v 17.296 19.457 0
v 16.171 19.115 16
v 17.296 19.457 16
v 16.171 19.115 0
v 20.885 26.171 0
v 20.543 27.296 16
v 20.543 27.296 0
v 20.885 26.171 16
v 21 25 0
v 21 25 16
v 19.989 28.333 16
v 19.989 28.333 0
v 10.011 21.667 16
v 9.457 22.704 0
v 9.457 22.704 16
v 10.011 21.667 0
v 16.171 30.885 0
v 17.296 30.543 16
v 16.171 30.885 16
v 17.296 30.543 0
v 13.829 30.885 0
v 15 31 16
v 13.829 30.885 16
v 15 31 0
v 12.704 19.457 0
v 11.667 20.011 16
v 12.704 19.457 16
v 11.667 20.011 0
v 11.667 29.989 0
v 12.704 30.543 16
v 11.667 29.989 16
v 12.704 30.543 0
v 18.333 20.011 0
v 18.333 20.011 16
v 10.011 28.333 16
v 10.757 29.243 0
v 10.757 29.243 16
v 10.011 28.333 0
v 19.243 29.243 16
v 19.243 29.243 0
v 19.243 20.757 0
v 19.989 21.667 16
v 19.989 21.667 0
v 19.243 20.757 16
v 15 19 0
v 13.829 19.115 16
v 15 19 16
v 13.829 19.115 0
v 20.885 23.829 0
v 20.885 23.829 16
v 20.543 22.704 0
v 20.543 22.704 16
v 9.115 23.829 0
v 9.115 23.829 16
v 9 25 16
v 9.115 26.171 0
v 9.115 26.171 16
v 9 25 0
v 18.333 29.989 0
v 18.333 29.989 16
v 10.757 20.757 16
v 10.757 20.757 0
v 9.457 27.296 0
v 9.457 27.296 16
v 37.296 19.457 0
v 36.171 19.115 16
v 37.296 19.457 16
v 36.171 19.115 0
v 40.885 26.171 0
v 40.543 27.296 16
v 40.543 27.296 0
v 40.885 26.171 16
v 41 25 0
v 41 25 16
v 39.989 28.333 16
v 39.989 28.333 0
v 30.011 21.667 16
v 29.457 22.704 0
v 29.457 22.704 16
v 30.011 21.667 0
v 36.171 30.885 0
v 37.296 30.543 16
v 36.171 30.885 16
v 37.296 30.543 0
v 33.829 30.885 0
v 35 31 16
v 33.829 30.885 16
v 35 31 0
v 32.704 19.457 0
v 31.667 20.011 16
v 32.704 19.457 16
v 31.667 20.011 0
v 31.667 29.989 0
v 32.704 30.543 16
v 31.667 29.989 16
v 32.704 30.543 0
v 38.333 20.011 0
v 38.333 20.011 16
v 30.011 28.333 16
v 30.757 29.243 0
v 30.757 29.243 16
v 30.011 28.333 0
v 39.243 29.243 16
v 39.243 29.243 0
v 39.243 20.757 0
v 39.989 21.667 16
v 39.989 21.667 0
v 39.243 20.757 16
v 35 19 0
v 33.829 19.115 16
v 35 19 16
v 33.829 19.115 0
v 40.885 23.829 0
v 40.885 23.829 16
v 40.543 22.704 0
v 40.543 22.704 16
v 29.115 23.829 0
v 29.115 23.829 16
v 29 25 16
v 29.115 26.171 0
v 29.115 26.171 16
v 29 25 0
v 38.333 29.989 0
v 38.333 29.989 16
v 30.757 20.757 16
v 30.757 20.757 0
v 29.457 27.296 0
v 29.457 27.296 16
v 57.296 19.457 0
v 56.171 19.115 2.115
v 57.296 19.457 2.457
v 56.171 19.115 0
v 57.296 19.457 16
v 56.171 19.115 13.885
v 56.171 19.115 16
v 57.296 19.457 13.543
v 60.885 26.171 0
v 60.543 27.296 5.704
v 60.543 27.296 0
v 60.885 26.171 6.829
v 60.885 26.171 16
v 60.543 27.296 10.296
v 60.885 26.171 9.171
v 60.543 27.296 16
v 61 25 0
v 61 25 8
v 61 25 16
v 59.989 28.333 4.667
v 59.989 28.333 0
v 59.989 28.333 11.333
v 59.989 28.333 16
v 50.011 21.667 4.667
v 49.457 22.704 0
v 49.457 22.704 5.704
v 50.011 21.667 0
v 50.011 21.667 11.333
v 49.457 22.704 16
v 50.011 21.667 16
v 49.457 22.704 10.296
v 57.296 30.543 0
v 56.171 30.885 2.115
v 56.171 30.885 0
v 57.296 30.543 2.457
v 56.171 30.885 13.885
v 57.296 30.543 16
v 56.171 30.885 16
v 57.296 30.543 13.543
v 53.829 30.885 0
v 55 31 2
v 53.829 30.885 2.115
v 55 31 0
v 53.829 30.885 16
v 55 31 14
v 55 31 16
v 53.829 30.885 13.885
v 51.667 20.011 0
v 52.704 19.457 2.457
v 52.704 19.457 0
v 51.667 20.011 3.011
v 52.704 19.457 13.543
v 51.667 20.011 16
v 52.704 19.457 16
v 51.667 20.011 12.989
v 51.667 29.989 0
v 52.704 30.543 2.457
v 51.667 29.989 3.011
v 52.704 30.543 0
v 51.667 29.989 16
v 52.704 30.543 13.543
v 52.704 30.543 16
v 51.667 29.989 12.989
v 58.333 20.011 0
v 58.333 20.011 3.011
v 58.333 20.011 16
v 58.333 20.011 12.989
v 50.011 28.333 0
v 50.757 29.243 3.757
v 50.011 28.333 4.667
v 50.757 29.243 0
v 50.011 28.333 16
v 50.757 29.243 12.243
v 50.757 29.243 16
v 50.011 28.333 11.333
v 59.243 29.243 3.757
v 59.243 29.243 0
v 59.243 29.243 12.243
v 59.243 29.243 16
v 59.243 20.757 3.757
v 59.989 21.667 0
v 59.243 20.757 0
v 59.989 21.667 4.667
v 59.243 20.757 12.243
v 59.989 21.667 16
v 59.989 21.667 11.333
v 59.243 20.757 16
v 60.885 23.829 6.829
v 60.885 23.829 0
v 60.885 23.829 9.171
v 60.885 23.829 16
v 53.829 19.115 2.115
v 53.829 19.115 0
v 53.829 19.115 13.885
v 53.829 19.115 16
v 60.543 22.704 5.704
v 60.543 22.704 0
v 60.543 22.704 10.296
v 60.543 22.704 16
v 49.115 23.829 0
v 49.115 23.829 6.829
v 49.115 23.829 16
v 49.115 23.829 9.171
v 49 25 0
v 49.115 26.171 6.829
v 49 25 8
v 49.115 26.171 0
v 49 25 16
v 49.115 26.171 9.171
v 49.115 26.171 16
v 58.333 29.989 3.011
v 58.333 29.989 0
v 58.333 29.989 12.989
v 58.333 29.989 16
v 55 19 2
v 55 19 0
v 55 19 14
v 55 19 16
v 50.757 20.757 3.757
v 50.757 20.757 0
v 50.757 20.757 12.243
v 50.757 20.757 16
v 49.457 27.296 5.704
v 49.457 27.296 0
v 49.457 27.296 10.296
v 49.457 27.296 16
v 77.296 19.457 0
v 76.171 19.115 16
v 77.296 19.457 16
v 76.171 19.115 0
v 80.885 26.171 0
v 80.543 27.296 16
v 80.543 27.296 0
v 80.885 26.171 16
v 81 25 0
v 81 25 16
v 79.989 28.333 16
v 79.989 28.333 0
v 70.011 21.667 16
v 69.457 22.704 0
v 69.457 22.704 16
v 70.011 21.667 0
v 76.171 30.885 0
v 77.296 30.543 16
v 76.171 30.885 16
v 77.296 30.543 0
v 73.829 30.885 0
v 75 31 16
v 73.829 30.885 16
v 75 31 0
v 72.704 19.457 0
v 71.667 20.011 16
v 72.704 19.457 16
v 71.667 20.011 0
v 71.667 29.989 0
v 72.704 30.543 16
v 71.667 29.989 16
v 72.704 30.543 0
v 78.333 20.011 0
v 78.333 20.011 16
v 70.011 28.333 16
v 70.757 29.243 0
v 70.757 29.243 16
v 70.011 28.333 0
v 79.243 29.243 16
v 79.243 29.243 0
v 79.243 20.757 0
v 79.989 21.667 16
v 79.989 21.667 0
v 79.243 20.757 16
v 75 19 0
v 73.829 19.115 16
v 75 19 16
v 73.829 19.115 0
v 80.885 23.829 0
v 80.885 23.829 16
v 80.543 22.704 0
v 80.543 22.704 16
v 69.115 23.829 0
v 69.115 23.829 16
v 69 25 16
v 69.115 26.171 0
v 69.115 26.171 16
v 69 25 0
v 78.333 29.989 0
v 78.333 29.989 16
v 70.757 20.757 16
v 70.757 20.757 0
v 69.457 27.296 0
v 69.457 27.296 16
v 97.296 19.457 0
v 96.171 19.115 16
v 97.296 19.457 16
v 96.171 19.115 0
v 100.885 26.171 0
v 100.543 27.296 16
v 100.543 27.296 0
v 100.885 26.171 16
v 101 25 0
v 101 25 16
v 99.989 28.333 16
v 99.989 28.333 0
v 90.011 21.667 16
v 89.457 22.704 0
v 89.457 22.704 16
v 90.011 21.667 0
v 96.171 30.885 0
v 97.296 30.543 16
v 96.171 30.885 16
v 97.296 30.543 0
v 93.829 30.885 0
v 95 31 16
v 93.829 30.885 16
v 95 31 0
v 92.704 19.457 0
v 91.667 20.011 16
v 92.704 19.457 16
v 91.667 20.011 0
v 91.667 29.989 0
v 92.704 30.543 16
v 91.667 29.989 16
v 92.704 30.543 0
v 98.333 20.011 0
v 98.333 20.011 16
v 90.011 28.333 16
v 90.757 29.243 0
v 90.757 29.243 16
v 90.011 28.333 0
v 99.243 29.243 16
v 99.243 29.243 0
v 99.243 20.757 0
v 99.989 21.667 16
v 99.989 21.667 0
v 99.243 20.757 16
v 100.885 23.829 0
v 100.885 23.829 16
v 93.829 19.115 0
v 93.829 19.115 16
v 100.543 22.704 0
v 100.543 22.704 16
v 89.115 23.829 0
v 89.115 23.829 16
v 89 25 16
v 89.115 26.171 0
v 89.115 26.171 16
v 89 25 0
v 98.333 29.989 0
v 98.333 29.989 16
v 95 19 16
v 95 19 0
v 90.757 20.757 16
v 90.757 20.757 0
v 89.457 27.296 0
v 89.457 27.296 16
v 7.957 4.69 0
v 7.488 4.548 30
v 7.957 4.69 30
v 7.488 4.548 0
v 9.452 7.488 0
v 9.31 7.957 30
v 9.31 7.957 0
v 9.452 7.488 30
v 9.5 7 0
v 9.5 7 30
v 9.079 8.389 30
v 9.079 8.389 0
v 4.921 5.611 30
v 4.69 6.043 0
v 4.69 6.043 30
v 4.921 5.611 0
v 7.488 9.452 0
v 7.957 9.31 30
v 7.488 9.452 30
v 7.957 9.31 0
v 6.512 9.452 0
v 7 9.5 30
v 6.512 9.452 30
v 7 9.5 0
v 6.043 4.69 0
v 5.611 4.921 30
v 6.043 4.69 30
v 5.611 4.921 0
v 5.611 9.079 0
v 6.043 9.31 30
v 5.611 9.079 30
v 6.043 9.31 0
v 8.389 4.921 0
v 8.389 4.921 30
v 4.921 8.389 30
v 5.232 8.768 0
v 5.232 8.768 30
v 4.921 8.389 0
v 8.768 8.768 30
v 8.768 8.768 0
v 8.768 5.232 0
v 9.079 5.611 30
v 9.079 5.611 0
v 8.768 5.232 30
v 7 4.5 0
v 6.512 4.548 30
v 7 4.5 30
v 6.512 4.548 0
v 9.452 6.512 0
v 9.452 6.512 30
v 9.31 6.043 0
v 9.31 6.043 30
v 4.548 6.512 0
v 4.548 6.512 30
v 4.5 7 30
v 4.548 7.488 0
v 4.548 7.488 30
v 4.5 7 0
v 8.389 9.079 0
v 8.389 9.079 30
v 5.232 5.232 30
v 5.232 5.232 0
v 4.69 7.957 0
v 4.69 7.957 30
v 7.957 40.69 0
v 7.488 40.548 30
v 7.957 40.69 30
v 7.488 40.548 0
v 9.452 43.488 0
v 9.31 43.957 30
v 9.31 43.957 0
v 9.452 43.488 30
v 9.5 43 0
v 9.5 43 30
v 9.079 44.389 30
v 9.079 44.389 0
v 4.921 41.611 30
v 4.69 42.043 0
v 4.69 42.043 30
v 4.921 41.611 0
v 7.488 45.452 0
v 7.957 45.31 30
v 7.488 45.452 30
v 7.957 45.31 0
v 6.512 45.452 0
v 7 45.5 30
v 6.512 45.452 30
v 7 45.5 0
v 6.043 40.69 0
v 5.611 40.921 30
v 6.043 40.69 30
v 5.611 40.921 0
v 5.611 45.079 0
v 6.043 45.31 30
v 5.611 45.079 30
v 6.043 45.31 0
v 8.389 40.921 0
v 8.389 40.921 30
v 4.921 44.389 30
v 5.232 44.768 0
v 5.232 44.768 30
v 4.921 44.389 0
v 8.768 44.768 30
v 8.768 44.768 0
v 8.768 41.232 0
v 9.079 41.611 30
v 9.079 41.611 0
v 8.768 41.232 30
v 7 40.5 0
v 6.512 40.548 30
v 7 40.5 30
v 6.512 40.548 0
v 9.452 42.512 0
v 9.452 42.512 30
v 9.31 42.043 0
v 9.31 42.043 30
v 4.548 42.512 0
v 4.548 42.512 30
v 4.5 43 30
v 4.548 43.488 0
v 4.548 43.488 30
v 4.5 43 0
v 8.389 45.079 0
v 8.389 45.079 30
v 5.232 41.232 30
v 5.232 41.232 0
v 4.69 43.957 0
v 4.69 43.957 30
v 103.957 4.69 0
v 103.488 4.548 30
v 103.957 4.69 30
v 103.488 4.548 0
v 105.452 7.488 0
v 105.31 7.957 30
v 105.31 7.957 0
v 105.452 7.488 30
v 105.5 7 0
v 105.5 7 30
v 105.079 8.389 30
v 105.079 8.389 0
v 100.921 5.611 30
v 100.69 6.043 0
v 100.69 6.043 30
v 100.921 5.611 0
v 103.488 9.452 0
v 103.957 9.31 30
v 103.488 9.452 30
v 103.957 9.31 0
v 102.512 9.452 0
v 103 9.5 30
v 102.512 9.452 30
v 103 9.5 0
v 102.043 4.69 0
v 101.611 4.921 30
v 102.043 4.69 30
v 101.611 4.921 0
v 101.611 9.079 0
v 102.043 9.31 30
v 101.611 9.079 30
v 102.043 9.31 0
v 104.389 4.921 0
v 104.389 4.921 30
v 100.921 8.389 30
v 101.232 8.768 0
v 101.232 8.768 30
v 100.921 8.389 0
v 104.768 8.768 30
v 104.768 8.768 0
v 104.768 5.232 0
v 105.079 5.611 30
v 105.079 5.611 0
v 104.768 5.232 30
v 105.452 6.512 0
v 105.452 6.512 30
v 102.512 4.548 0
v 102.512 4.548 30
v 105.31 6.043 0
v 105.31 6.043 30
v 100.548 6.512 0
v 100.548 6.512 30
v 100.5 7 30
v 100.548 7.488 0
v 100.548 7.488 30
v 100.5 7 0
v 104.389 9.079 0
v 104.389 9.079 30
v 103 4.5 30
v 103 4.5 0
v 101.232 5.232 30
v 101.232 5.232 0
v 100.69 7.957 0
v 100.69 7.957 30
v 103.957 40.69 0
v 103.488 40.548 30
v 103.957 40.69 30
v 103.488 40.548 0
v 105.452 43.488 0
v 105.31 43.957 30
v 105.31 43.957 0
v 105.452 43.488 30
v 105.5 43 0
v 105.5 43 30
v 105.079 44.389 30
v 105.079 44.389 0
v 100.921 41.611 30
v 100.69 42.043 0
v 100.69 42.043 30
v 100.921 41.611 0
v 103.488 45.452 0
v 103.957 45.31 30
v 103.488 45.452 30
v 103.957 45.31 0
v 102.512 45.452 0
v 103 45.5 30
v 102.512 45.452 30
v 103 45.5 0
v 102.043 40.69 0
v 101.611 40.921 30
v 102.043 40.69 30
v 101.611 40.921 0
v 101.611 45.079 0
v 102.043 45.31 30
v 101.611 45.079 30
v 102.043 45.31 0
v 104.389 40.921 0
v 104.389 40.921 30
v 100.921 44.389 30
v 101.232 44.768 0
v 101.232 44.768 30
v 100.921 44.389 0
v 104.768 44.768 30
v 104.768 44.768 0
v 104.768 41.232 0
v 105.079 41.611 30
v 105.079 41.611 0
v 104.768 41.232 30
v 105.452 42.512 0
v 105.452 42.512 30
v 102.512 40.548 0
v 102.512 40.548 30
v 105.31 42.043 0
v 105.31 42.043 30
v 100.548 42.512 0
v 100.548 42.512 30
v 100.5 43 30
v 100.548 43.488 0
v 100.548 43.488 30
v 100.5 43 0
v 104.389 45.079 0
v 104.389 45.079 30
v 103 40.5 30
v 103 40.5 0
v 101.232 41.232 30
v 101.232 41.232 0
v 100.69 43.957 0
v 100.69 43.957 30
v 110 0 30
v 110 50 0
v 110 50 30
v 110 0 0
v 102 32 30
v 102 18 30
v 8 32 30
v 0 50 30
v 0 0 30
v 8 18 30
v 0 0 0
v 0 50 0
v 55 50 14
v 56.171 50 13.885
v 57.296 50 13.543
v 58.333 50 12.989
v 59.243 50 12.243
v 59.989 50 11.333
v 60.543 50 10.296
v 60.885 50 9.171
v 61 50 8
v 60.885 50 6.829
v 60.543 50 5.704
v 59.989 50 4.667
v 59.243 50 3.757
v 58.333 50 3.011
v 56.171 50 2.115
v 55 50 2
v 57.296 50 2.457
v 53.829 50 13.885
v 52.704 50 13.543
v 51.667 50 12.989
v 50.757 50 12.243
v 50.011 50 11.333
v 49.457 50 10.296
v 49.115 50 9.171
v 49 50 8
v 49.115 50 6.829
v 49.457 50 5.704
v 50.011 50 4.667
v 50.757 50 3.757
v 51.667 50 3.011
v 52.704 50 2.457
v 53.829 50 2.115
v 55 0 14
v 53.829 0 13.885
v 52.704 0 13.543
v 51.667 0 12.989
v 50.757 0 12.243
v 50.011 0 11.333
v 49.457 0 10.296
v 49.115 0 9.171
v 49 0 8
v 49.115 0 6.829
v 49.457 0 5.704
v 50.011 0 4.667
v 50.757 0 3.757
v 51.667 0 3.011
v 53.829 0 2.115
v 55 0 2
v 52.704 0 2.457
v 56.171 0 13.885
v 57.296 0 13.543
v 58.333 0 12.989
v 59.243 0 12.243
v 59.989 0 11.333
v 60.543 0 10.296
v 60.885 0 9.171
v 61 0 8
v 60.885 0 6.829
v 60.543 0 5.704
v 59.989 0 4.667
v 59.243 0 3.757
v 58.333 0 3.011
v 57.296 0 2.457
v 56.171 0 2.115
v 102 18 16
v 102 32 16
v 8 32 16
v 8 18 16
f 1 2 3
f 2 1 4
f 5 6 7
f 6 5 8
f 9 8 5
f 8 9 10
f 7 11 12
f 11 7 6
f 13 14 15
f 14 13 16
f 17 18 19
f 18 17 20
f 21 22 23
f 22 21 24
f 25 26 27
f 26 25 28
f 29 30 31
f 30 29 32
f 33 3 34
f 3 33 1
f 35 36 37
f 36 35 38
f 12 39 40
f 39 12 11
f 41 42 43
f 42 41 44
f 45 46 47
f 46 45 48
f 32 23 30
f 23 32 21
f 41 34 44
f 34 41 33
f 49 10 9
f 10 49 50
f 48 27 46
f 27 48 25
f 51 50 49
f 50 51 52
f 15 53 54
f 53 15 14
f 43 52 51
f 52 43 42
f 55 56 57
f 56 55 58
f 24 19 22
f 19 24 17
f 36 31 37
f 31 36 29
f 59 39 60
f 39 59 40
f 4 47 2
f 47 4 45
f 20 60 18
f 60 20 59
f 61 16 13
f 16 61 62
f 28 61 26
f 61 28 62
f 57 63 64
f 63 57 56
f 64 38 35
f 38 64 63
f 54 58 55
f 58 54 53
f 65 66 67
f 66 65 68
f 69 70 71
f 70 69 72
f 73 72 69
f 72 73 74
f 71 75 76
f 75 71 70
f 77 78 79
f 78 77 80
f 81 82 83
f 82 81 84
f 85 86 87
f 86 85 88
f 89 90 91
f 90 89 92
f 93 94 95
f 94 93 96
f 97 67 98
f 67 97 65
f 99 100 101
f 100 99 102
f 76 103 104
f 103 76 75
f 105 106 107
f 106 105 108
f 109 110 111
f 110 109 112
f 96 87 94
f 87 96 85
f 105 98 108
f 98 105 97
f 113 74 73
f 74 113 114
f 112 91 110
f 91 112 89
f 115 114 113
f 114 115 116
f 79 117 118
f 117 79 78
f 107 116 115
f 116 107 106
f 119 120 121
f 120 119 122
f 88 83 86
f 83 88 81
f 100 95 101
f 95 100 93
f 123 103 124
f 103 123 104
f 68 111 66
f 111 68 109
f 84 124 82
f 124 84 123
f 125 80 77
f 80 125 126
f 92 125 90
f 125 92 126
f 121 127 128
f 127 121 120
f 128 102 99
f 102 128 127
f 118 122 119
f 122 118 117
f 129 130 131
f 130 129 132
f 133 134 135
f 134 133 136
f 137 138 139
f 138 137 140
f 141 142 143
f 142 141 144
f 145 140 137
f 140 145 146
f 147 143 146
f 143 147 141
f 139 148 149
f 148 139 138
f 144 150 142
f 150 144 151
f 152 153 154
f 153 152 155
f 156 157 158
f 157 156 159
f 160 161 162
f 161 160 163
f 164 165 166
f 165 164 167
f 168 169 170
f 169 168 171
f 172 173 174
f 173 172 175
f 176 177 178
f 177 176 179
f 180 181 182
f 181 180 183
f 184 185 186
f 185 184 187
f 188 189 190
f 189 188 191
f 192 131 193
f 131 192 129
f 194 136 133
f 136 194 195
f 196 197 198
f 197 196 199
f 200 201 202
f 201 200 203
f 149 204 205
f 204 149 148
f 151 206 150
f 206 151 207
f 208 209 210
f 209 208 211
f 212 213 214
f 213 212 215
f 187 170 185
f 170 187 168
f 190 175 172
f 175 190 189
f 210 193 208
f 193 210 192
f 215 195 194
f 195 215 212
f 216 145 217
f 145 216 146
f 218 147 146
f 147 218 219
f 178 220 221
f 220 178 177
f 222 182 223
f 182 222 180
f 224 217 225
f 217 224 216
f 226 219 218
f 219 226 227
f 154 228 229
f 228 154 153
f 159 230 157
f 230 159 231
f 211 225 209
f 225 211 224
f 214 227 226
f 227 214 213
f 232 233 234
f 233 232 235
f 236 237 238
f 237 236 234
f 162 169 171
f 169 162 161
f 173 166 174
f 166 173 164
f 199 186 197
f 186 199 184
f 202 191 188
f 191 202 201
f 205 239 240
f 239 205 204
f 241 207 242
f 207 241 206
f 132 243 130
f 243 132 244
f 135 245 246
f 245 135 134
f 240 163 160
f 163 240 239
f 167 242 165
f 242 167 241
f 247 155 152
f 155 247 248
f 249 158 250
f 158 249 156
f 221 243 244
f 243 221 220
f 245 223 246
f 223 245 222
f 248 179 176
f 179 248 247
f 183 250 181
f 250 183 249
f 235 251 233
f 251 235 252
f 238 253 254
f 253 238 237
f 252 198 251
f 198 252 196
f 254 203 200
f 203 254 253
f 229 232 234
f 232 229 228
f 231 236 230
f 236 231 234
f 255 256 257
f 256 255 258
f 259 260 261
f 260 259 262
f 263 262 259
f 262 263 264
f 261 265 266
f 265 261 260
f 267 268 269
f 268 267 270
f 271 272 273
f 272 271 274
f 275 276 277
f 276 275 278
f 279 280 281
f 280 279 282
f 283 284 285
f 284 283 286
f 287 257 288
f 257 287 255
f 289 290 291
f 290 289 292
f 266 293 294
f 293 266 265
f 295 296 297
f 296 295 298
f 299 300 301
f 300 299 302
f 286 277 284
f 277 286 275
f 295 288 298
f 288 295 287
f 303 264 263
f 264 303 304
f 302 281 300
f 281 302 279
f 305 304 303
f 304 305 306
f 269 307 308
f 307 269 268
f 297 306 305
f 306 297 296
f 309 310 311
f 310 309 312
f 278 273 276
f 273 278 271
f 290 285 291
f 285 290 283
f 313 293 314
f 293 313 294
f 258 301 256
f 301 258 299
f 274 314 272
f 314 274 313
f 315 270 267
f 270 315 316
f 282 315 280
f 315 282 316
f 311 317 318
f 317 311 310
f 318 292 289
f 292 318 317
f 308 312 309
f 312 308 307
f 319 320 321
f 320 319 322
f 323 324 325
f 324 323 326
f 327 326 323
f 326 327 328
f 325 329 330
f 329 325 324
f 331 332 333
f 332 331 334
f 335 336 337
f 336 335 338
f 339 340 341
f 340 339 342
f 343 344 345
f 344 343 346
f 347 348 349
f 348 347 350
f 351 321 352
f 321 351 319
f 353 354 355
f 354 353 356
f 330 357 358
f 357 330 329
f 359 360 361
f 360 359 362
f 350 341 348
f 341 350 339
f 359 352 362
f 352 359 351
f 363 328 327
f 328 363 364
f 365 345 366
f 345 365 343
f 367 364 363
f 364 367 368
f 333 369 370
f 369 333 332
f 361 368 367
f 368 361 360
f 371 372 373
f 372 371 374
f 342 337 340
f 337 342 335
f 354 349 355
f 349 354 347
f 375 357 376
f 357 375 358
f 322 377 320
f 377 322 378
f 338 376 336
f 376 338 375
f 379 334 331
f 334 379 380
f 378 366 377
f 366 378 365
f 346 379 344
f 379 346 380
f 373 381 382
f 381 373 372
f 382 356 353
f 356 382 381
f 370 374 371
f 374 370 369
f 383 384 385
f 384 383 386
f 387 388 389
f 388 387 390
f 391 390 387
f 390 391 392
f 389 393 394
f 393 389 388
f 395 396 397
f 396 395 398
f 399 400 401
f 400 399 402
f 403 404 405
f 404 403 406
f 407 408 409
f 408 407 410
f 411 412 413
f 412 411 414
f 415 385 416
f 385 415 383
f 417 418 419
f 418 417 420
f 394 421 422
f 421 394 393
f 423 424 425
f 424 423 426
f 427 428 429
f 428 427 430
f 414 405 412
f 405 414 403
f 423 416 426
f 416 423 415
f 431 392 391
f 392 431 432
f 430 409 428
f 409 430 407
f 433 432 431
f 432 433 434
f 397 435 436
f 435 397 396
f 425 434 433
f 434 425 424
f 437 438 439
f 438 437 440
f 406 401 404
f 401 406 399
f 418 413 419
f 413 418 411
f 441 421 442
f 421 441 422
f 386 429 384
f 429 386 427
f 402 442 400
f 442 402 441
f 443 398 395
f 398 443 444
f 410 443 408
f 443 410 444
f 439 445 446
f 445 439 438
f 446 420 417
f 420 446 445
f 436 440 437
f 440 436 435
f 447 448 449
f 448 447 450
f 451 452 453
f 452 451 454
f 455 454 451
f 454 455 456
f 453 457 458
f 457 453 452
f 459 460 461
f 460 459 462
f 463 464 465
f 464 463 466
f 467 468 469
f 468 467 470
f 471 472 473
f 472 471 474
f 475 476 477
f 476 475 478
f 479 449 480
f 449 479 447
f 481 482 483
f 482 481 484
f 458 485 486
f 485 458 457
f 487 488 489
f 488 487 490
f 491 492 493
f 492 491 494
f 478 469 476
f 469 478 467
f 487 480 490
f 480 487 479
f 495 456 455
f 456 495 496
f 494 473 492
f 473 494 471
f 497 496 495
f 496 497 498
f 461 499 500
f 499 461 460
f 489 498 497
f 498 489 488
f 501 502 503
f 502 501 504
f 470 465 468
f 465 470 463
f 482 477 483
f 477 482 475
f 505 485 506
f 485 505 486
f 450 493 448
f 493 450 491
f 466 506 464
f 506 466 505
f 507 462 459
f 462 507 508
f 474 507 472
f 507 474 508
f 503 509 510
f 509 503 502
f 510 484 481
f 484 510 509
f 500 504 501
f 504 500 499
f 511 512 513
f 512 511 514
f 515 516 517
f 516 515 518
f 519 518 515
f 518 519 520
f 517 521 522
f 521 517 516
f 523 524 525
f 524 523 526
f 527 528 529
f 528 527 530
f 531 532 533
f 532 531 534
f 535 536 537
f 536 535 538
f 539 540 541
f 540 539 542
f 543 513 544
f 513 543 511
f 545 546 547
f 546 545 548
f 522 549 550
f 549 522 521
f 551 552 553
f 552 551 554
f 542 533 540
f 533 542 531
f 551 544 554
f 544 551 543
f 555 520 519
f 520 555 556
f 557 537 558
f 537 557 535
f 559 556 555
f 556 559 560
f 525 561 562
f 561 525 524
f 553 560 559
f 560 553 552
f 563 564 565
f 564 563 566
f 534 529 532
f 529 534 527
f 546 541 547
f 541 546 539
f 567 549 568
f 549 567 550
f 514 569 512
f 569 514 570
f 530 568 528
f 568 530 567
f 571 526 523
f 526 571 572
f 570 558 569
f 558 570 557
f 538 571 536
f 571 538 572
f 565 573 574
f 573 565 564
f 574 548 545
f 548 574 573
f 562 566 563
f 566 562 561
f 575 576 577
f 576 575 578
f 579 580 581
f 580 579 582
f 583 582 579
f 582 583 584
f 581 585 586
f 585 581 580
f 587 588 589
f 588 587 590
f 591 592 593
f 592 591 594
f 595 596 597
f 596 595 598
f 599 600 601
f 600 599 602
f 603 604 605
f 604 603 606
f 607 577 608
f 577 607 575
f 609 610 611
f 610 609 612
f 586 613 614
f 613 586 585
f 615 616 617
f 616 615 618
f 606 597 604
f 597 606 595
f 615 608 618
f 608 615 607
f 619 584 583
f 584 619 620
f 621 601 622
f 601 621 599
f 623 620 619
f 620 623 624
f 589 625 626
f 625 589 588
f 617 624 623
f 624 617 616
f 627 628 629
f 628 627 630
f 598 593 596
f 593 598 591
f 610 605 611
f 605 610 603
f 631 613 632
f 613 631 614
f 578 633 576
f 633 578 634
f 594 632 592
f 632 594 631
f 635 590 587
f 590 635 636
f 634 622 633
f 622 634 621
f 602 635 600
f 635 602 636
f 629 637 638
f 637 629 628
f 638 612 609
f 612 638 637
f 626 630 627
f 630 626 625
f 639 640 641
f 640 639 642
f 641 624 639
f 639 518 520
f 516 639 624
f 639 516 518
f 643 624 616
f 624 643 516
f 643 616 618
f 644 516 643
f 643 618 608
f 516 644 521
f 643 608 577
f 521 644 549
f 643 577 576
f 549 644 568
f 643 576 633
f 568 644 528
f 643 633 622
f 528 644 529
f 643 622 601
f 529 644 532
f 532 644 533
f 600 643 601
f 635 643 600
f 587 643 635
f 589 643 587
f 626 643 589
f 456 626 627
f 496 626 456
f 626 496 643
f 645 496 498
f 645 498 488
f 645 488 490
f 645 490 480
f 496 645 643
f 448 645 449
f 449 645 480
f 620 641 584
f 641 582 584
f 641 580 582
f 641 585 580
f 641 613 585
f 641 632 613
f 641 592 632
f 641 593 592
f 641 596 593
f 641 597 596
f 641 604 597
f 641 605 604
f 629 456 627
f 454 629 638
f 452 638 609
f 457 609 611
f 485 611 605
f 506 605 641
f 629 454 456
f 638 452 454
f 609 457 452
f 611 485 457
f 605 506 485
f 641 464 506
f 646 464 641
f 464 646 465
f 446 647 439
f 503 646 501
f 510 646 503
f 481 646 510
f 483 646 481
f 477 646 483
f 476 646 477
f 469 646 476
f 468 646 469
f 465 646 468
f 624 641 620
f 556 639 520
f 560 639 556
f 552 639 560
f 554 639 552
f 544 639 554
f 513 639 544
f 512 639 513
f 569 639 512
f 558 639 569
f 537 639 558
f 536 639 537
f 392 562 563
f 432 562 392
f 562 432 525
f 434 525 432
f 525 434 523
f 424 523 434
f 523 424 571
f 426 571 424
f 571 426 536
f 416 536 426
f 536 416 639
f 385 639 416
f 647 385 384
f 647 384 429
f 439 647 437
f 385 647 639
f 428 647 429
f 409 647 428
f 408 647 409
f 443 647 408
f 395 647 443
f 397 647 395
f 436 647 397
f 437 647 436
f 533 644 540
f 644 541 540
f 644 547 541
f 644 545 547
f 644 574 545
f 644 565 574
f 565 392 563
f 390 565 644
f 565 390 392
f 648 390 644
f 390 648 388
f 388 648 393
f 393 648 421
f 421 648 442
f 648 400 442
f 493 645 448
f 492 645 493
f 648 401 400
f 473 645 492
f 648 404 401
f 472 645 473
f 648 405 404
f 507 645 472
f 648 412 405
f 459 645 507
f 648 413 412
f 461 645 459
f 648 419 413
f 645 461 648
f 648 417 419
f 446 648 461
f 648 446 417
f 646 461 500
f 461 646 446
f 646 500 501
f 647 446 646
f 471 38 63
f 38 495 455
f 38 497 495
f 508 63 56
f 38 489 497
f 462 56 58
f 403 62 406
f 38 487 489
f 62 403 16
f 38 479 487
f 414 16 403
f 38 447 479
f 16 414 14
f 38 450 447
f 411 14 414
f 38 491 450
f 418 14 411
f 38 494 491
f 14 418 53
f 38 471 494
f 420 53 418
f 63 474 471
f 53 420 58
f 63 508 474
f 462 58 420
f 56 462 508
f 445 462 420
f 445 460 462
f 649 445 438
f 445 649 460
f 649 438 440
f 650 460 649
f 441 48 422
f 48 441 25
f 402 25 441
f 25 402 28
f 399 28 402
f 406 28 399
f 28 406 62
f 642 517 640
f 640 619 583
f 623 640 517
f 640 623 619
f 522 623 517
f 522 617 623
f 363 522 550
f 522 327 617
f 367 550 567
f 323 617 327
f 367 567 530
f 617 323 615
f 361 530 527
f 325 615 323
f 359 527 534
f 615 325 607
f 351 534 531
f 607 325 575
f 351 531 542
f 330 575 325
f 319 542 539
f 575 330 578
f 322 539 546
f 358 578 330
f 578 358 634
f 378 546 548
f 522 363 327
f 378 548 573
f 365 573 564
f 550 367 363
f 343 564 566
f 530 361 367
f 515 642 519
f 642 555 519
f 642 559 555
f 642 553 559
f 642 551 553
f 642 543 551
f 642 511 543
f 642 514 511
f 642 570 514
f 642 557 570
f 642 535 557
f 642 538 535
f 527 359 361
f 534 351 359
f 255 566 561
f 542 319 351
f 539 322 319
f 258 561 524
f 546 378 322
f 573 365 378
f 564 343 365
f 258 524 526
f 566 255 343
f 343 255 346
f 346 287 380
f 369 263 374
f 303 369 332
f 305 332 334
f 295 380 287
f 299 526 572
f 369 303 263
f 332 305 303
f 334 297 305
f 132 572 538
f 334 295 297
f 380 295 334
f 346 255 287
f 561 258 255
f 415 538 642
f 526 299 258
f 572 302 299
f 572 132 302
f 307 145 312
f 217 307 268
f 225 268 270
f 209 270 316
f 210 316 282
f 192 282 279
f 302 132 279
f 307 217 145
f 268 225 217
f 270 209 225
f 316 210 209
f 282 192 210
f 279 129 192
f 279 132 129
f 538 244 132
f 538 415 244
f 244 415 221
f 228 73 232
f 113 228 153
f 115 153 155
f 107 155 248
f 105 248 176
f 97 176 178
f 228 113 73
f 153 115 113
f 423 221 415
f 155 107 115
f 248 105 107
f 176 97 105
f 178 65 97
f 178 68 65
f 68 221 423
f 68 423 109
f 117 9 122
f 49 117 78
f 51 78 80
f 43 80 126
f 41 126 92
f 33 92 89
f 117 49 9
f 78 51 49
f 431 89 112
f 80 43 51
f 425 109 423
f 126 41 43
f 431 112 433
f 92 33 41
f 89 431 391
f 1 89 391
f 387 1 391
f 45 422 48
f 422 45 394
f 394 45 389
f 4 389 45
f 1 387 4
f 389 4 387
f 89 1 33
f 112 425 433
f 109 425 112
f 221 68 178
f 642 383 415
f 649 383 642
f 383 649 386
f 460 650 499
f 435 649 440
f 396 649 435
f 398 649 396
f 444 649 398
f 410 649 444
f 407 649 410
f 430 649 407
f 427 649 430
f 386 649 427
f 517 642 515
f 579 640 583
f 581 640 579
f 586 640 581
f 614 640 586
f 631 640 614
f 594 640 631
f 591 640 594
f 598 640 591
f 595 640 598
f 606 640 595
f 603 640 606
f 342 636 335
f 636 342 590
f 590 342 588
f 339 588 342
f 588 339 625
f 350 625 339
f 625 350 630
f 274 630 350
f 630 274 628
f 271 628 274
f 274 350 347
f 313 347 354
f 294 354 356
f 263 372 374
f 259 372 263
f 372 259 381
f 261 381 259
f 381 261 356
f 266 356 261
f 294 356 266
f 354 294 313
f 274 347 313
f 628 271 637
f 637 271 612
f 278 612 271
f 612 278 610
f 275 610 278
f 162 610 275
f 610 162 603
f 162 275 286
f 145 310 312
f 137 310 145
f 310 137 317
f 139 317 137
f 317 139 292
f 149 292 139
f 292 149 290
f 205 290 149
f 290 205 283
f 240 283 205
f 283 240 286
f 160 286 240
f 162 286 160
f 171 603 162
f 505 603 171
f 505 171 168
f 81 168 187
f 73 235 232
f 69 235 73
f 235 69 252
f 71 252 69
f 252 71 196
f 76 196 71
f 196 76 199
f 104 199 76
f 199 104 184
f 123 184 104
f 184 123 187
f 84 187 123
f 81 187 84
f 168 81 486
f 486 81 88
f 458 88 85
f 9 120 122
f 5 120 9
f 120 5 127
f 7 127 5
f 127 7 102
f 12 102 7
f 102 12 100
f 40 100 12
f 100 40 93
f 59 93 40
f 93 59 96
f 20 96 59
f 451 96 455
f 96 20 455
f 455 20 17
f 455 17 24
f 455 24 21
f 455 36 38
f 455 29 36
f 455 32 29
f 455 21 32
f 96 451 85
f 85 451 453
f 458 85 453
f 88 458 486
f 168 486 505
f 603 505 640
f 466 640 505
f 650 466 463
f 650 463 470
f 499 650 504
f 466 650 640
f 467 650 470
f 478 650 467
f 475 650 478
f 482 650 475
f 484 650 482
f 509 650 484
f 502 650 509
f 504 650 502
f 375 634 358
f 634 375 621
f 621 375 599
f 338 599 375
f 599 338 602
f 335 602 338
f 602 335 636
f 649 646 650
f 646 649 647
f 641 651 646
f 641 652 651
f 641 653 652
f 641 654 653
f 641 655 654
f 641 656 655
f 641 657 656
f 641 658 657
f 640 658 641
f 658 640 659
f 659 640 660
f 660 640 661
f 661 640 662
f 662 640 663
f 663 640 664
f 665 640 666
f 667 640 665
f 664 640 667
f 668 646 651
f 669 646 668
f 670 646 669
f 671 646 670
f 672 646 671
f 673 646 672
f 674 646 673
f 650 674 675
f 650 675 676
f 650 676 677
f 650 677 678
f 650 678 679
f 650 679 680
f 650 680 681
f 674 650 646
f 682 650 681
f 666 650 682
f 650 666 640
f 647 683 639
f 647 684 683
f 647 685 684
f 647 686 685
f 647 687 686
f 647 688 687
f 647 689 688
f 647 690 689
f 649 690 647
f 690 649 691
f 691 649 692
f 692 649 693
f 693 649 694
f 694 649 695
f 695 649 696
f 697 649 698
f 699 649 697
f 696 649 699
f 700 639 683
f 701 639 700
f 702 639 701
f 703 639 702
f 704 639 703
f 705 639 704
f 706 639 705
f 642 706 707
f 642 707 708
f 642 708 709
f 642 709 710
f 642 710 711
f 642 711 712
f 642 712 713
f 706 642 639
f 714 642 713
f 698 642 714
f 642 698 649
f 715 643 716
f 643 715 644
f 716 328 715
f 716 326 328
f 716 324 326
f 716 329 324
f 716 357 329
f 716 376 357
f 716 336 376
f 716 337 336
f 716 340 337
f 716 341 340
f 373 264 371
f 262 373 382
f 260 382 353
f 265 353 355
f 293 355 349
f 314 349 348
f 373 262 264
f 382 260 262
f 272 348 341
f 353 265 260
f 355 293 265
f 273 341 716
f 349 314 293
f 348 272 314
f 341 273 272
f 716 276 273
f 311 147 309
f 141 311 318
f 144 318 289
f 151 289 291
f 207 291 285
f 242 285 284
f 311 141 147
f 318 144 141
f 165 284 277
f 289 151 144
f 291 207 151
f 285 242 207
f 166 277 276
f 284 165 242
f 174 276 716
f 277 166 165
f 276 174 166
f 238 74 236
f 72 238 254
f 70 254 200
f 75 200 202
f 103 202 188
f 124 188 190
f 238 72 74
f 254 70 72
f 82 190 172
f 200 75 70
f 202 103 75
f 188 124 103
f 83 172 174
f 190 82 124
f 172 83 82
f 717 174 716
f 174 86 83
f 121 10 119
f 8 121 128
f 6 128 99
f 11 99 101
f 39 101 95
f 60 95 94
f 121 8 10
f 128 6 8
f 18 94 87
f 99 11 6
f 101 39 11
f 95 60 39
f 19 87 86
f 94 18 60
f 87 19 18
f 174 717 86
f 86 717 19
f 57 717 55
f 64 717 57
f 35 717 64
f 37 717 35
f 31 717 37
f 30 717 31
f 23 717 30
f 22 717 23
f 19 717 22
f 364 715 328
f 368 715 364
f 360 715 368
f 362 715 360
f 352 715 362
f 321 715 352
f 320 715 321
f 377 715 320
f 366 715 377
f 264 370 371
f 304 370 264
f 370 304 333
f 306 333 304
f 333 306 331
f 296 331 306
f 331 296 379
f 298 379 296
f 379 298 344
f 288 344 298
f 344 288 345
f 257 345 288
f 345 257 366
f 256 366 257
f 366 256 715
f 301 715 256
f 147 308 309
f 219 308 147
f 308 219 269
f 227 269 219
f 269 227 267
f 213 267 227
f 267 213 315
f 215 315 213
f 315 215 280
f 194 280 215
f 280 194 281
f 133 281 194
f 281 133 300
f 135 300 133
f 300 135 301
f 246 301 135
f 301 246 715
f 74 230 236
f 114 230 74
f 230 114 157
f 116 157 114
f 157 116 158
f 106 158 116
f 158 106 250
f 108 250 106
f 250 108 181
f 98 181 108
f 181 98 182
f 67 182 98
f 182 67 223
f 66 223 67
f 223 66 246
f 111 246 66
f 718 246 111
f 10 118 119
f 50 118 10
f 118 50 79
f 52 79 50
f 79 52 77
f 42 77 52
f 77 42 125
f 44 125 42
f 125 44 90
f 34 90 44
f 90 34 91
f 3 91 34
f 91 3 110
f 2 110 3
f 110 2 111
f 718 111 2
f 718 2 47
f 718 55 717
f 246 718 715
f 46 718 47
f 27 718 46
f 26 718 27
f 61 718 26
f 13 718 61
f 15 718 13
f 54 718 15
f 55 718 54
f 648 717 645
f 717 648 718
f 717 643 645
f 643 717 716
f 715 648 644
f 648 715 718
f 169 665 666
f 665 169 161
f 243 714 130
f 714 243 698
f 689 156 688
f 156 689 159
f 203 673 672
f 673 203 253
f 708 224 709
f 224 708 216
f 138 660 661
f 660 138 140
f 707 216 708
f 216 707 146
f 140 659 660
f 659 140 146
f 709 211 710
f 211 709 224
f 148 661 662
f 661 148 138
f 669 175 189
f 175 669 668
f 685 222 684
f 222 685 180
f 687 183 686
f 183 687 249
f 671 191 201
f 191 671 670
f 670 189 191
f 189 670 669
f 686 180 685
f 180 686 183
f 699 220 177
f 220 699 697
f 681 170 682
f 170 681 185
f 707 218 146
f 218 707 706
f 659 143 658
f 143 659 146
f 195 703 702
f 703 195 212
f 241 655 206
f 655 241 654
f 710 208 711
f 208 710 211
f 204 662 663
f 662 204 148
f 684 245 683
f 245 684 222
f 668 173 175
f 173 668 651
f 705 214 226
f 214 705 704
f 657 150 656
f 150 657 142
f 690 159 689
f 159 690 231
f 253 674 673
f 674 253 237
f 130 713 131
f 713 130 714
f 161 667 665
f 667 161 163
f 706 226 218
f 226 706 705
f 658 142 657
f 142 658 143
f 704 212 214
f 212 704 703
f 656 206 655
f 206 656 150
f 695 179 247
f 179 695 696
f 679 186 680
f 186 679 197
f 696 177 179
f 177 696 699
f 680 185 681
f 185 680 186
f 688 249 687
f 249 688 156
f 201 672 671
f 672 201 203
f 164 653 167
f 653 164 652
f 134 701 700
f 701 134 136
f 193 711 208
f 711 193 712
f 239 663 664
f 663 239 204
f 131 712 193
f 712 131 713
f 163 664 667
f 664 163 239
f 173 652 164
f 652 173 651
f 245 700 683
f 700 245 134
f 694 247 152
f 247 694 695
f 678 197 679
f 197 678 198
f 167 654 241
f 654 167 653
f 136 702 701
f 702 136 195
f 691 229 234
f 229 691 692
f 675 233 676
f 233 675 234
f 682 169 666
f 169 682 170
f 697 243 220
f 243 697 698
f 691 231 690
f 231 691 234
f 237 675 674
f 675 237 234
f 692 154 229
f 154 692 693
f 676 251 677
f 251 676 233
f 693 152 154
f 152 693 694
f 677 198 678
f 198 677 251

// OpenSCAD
$fn = 32;

// ----------------------------------------------------------------------
// Manifold block: side_outlet manifold
// ----------------------------------------------------------------------

// --- parameters (mm) ---
block_l = 110;            // block length, X
block_w = 50;             // block width, Y
block_h = 30;             // block height, Z
port_d = 12;              // port bore diameter
port_pitch = 20;          // port pitch along X
gallery_d = 14;           // top gallery width, Y
gallery_depth = 14;       // gallery pocket depth
wall_p = 8;               // gallery end wall thickness, X
mnt_d = 5;                // mounting hole diameter
mnt_in = 7;               // mounting hole inset from the edges
out_d = 12;               // outlet bore diameter
out_z = 8;                // outlet axis height

n_ports = 5;  // ports in the row
port_x0 = (block_l - (n_ports - 1) * port_pitch) / 2;  // first port X

difference() {
  cube([block_l, block_w, block_h]);
  for (i = [0 : n_ports - 1])
    translate([port_x0 + i * port_pitch, block_w / 2, -1])
      cylinder(h = block_h + 2, d = port_d);
  translate([wall_p, block_w / 2 - gallery_d / 2, block_h - gallery_depth])
    cube([block_l - 2 * wall_p, gallery_d, gallery_depth + 1]);
  for (cx = [mnt_in, block_l - mnt_in])
    for (cy = [mnt_in, block_w - mnt_in])
      translate([cx, cy, -1]) cylinder(h = block_h + 2, d = mnt_d);
  translate([block_l / 2, -1, out_z]) rotate([-90, 0, 0])
    cylinder(h = block_w + 2, d = out_d);
}
